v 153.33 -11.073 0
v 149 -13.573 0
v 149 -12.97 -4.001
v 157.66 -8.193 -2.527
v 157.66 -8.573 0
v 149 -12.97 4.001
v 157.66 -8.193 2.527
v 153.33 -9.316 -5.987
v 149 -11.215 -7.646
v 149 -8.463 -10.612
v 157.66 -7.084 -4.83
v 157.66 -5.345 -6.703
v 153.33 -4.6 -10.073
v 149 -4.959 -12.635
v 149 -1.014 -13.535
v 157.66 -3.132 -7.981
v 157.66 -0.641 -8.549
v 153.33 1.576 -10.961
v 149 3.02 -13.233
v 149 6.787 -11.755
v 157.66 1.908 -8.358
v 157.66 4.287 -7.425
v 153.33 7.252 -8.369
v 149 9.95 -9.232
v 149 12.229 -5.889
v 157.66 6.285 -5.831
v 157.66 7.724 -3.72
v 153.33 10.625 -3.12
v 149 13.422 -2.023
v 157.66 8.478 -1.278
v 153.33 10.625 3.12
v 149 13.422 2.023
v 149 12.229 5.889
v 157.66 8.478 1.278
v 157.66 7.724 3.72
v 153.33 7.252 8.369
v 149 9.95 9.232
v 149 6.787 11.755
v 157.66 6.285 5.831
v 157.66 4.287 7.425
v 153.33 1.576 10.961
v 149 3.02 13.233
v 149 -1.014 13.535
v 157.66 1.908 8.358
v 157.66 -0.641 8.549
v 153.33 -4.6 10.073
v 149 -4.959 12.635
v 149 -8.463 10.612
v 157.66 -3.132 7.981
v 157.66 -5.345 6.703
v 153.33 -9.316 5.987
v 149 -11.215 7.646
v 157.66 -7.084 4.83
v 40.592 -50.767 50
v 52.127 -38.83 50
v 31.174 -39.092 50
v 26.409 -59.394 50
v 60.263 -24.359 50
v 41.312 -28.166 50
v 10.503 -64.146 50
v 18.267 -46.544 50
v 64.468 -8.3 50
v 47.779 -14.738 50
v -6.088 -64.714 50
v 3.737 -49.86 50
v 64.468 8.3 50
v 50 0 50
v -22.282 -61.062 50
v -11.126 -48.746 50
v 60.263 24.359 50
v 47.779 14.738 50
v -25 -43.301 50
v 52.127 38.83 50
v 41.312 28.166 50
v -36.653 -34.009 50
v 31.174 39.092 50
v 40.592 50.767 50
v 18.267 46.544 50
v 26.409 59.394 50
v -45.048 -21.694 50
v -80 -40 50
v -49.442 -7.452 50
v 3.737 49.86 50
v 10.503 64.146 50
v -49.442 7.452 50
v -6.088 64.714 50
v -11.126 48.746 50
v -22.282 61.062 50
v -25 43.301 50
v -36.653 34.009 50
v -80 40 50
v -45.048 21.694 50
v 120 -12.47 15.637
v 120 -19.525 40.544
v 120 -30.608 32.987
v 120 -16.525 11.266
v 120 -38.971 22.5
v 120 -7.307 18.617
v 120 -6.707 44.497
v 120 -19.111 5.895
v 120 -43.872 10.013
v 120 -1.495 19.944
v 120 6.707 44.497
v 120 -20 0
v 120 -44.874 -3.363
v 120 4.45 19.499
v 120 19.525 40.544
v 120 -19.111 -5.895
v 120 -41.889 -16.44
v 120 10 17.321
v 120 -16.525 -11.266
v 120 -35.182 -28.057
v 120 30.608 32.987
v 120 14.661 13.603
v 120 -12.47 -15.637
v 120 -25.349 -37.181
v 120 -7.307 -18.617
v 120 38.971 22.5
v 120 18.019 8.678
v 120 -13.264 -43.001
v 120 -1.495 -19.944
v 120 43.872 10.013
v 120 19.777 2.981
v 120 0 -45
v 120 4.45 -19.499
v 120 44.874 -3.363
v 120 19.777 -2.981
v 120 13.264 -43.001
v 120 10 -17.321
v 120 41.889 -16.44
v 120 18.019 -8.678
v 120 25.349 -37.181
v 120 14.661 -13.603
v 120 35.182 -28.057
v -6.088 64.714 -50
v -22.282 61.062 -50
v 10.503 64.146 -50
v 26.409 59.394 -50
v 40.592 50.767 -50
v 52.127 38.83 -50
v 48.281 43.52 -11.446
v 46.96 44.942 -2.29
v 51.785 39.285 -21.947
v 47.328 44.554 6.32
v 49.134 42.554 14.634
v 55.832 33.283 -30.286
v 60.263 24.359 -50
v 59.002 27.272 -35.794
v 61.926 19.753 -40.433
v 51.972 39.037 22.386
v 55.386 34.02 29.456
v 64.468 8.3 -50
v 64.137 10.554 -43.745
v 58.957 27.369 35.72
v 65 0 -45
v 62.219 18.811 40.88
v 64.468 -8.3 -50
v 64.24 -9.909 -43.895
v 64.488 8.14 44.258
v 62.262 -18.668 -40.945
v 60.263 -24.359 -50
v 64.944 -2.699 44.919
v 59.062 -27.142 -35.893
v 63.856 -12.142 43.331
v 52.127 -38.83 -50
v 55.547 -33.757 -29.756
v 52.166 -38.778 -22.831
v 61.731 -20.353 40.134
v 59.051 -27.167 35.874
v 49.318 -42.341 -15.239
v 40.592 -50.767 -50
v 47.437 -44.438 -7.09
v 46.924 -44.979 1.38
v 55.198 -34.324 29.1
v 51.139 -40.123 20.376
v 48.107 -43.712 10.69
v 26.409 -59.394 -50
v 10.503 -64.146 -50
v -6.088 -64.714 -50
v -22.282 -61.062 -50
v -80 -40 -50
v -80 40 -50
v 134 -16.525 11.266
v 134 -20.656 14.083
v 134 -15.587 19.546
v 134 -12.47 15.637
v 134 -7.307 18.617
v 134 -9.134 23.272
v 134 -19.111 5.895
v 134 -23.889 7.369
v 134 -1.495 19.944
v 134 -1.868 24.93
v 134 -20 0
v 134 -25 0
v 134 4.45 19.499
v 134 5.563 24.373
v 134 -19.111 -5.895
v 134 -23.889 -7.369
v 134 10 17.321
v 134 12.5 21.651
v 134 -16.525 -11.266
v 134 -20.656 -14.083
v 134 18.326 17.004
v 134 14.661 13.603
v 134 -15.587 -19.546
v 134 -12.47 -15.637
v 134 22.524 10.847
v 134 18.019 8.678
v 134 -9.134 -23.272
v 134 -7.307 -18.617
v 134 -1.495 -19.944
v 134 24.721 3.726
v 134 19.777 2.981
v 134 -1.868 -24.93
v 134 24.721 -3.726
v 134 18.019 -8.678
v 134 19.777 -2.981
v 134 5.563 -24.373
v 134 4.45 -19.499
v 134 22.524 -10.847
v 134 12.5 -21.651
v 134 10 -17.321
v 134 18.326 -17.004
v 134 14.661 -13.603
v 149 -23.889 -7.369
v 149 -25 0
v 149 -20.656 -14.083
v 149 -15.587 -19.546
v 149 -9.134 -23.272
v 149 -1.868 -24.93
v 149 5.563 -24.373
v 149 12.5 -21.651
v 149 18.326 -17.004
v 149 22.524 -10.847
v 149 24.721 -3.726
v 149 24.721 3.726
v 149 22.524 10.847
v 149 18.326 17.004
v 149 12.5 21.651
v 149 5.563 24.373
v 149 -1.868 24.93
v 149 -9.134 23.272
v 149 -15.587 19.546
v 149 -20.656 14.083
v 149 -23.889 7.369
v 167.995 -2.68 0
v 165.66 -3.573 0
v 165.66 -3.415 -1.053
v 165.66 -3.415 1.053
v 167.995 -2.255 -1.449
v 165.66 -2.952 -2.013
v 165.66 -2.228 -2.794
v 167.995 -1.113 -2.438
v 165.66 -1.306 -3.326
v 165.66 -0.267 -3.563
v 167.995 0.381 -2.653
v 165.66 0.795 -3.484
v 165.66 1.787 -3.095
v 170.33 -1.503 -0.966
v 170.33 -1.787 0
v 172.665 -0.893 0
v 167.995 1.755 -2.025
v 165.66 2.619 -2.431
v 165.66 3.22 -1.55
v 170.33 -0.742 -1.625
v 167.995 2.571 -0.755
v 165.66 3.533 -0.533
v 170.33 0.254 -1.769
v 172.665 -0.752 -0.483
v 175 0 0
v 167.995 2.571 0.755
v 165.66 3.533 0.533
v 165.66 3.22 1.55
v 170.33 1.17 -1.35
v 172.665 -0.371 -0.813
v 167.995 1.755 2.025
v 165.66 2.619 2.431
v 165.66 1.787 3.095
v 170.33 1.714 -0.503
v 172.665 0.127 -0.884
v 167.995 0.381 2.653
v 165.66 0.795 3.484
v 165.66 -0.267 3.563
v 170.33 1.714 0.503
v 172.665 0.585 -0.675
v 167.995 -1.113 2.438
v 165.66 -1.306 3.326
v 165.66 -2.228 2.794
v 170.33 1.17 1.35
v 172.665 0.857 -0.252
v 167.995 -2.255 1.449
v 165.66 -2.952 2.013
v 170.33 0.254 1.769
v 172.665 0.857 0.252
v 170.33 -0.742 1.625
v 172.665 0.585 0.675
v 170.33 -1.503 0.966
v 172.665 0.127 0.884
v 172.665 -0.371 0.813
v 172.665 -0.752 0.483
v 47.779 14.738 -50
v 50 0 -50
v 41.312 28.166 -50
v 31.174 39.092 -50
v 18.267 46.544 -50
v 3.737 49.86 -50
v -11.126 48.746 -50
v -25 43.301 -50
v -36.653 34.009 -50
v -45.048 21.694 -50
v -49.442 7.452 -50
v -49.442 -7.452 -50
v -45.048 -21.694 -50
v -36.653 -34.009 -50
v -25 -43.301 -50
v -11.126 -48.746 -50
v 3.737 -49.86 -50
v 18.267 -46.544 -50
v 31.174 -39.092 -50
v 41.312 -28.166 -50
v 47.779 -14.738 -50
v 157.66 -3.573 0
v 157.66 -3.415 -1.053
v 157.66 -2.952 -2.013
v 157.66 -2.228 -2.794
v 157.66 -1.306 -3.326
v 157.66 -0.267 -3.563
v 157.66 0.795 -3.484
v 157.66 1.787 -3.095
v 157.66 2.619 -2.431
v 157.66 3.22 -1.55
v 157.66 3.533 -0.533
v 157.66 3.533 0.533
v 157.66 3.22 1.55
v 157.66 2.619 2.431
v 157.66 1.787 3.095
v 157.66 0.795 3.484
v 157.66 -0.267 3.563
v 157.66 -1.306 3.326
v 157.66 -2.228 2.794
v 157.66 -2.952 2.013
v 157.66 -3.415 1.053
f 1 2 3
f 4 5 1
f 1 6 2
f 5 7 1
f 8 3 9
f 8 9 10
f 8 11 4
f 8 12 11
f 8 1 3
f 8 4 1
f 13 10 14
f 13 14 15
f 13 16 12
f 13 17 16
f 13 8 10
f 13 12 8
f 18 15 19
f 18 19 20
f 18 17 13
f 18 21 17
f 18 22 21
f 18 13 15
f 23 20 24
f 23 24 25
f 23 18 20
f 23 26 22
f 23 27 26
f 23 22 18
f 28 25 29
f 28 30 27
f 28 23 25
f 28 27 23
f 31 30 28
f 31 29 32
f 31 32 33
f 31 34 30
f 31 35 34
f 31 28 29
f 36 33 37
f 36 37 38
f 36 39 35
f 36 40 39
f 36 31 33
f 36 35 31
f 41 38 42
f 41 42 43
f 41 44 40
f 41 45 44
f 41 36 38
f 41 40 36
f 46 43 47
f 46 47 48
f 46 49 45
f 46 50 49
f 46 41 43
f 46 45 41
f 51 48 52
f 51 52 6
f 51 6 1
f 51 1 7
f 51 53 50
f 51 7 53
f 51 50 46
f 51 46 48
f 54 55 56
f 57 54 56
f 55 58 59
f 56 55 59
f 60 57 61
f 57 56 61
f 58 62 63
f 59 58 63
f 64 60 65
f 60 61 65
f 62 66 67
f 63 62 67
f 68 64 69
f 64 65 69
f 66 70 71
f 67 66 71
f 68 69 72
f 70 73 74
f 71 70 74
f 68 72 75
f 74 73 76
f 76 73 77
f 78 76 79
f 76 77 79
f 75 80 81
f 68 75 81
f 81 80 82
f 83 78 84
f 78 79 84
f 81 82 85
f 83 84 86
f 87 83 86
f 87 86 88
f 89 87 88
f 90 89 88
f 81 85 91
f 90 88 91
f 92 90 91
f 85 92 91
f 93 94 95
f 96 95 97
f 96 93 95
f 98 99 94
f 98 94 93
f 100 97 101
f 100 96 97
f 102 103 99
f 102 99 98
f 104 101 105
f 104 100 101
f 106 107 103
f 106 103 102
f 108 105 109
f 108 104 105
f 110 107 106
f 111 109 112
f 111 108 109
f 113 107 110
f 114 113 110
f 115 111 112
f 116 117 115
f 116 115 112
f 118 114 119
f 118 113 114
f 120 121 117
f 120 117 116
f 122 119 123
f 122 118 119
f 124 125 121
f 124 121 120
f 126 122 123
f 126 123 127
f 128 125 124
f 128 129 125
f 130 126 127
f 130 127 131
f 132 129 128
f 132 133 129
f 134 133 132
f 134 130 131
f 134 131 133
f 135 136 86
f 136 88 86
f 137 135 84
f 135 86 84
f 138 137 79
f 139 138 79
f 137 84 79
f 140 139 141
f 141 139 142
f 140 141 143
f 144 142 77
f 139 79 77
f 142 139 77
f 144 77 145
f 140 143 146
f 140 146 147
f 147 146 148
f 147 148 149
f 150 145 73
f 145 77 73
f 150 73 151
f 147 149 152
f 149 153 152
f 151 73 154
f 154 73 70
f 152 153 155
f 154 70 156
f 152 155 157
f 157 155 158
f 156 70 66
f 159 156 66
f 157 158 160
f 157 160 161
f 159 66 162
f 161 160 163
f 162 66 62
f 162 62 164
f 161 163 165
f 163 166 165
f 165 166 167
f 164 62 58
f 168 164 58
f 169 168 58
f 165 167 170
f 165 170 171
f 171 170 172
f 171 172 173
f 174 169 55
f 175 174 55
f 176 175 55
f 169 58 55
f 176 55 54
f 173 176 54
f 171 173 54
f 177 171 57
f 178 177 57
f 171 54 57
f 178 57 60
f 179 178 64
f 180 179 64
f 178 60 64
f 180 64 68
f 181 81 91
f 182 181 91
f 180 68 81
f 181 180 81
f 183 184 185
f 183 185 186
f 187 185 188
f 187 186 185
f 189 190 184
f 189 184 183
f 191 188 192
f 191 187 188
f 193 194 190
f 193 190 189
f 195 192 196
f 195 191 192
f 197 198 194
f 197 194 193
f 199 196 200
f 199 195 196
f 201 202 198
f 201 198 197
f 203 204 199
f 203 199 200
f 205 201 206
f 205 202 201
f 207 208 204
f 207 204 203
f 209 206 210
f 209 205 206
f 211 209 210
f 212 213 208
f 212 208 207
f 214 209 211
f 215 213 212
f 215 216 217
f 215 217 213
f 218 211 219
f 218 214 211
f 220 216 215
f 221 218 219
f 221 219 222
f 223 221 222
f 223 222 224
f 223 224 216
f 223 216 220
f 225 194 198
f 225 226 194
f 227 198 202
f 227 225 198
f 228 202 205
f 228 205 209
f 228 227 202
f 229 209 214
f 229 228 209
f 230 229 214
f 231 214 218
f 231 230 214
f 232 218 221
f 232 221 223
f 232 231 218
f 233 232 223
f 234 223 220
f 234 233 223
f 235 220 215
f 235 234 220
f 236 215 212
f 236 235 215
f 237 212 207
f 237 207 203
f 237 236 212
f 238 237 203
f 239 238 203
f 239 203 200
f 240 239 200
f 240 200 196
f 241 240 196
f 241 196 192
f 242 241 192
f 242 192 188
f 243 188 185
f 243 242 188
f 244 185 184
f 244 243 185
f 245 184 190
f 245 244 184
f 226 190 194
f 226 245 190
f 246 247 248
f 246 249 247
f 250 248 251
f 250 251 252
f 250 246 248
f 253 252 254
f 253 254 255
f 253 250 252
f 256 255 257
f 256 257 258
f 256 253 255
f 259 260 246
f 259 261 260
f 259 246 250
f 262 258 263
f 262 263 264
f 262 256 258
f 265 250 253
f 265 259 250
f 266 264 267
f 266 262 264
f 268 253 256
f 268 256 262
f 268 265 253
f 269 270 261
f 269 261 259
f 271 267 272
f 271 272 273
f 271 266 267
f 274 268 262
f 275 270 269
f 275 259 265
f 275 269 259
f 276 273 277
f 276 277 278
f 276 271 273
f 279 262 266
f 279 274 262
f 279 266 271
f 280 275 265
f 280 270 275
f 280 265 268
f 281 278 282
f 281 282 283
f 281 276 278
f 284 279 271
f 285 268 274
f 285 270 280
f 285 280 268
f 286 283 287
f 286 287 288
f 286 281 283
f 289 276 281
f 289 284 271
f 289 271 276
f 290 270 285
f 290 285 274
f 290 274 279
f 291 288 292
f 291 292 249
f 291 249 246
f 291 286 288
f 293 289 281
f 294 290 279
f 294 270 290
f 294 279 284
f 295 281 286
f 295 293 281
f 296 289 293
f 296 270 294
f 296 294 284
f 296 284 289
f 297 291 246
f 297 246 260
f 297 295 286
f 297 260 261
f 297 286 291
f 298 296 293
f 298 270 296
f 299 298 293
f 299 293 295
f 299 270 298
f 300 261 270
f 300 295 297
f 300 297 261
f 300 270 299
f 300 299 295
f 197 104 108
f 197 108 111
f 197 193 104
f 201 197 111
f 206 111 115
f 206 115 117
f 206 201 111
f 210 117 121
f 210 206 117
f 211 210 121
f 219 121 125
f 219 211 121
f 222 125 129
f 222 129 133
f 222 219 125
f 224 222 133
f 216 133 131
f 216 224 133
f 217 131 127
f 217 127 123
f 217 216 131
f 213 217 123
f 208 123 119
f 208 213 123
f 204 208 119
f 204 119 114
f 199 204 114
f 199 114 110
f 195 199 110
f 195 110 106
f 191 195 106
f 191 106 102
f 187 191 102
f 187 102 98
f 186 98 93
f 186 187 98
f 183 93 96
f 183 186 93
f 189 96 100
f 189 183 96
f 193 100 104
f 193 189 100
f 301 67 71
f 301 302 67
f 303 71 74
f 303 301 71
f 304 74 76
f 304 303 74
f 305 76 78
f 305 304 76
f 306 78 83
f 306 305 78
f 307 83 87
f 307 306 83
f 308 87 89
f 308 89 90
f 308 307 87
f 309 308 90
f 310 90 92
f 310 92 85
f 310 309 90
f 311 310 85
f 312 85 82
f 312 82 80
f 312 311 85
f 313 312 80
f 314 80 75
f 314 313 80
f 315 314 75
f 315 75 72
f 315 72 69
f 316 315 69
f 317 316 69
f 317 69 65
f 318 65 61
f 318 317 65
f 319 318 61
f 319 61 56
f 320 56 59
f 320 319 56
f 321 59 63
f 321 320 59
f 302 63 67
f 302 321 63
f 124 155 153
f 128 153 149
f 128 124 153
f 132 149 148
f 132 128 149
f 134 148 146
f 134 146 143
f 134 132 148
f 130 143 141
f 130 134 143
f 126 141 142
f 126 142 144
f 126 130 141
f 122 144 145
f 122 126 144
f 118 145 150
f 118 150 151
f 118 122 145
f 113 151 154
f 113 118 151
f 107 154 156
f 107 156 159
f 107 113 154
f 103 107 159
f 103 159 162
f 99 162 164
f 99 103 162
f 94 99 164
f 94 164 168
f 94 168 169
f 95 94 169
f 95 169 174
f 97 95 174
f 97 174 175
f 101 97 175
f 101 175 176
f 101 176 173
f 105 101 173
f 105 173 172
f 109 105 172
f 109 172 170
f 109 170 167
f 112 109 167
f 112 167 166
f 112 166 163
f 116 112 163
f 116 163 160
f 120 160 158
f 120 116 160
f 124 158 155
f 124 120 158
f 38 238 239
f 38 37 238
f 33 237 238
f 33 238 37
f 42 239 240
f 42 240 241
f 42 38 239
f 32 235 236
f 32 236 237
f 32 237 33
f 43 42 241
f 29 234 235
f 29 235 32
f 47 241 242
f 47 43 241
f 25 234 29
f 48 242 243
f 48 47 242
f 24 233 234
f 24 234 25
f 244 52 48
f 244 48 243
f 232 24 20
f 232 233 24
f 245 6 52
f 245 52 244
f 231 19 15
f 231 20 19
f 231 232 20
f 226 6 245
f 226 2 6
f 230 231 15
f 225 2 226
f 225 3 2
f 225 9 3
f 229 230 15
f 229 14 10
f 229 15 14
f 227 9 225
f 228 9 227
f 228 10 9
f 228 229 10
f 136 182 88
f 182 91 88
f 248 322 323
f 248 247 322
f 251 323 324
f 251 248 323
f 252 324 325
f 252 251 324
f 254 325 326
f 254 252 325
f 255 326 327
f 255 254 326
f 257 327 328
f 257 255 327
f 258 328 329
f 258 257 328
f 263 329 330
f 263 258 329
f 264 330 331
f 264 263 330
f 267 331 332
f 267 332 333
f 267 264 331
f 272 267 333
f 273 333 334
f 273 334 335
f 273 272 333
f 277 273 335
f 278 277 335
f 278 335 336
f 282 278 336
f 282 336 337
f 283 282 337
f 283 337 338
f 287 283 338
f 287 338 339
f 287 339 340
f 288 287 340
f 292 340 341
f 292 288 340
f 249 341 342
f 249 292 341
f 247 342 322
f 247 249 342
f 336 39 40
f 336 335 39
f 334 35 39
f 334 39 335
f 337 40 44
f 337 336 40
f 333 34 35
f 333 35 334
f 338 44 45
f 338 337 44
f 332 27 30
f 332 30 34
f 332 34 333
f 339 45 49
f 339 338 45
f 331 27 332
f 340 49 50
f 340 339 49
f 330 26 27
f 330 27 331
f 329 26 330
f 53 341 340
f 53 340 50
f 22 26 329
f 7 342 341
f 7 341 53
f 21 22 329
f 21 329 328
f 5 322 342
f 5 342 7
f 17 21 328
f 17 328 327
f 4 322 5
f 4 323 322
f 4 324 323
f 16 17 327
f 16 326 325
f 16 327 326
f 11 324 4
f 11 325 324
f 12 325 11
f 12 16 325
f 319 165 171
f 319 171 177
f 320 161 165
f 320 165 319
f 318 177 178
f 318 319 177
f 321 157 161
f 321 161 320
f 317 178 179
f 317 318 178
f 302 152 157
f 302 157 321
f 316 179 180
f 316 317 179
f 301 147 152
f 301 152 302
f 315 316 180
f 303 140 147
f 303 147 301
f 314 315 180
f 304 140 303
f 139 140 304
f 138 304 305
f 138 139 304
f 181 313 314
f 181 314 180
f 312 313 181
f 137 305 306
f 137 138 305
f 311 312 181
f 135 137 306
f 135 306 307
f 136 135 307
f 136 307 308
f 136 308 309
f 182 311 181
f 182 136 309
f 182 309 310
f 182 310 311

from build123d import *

# Parameters (mm, degrees)
SKETCH1_R           = 50
BOSS_EXTRUDE1_DEPTH = 50
BOSS_EXTRUDE2_REACH = 202
SKETCH2_R           = 45


with BuildPart() as part:
    # Sketch1 → Boss-Extrude1 (new body, symmetric)
    with BuildSketch(Plane.XY):
        with BuildLine():
            Line((-80, -40), (-80, 40))
            Line((-80, 40), (-22.281665693, 61.061668614))
            ThreePointArc((-22.281665693, 61.061668614), (65, 0), (-22.281665693, -61.061668614))
            Line((-22.281665693, -61.061668614), (-80, -40))
        make_face()
        Circle(SKETCH1_R, mode=Mode.SUBTRACT)
    extrude(amount=BOSS_EXTRUDE1_DEPTH, both=True)

    # Sketch2 → Boss-Extrude2 (add, up to next)
    with BuildSketch(Plane(origin=(120, 0, 0), x_dir=(0, 0, -1), z_dir=(1, 0, 0)), mode=Mode.PRIVATE) as boss_extrude2_sk1:
        Circle(SKETCH2_R)
    boss_extrude2_tool1 = extrude(boss_extrude2_sk1.sketch, amount=-BOSS_EXTRUDE2_REACH, mode=Mode.PRIVATE) - part.part
    add(boss_extrude2_tool1.solids().sort_by_distance((120, 0, 0))[0])

    # Sketch5 → Revolve1 (revolve)
    with BuildSketch(Plane.XY):
        Polygon((120, 0), (120, -20), (134, -20), (134, -25), (149, -25), (149, -13.573394096), (157.660254038, -8.573394096), (157.660254038, -3.573394096), (165.660254038, -3.573394096), (175, 0), align=None)
    revolve(axis=Axis((0, 0, 0), (1, 0, 0)))


solid = part.part
